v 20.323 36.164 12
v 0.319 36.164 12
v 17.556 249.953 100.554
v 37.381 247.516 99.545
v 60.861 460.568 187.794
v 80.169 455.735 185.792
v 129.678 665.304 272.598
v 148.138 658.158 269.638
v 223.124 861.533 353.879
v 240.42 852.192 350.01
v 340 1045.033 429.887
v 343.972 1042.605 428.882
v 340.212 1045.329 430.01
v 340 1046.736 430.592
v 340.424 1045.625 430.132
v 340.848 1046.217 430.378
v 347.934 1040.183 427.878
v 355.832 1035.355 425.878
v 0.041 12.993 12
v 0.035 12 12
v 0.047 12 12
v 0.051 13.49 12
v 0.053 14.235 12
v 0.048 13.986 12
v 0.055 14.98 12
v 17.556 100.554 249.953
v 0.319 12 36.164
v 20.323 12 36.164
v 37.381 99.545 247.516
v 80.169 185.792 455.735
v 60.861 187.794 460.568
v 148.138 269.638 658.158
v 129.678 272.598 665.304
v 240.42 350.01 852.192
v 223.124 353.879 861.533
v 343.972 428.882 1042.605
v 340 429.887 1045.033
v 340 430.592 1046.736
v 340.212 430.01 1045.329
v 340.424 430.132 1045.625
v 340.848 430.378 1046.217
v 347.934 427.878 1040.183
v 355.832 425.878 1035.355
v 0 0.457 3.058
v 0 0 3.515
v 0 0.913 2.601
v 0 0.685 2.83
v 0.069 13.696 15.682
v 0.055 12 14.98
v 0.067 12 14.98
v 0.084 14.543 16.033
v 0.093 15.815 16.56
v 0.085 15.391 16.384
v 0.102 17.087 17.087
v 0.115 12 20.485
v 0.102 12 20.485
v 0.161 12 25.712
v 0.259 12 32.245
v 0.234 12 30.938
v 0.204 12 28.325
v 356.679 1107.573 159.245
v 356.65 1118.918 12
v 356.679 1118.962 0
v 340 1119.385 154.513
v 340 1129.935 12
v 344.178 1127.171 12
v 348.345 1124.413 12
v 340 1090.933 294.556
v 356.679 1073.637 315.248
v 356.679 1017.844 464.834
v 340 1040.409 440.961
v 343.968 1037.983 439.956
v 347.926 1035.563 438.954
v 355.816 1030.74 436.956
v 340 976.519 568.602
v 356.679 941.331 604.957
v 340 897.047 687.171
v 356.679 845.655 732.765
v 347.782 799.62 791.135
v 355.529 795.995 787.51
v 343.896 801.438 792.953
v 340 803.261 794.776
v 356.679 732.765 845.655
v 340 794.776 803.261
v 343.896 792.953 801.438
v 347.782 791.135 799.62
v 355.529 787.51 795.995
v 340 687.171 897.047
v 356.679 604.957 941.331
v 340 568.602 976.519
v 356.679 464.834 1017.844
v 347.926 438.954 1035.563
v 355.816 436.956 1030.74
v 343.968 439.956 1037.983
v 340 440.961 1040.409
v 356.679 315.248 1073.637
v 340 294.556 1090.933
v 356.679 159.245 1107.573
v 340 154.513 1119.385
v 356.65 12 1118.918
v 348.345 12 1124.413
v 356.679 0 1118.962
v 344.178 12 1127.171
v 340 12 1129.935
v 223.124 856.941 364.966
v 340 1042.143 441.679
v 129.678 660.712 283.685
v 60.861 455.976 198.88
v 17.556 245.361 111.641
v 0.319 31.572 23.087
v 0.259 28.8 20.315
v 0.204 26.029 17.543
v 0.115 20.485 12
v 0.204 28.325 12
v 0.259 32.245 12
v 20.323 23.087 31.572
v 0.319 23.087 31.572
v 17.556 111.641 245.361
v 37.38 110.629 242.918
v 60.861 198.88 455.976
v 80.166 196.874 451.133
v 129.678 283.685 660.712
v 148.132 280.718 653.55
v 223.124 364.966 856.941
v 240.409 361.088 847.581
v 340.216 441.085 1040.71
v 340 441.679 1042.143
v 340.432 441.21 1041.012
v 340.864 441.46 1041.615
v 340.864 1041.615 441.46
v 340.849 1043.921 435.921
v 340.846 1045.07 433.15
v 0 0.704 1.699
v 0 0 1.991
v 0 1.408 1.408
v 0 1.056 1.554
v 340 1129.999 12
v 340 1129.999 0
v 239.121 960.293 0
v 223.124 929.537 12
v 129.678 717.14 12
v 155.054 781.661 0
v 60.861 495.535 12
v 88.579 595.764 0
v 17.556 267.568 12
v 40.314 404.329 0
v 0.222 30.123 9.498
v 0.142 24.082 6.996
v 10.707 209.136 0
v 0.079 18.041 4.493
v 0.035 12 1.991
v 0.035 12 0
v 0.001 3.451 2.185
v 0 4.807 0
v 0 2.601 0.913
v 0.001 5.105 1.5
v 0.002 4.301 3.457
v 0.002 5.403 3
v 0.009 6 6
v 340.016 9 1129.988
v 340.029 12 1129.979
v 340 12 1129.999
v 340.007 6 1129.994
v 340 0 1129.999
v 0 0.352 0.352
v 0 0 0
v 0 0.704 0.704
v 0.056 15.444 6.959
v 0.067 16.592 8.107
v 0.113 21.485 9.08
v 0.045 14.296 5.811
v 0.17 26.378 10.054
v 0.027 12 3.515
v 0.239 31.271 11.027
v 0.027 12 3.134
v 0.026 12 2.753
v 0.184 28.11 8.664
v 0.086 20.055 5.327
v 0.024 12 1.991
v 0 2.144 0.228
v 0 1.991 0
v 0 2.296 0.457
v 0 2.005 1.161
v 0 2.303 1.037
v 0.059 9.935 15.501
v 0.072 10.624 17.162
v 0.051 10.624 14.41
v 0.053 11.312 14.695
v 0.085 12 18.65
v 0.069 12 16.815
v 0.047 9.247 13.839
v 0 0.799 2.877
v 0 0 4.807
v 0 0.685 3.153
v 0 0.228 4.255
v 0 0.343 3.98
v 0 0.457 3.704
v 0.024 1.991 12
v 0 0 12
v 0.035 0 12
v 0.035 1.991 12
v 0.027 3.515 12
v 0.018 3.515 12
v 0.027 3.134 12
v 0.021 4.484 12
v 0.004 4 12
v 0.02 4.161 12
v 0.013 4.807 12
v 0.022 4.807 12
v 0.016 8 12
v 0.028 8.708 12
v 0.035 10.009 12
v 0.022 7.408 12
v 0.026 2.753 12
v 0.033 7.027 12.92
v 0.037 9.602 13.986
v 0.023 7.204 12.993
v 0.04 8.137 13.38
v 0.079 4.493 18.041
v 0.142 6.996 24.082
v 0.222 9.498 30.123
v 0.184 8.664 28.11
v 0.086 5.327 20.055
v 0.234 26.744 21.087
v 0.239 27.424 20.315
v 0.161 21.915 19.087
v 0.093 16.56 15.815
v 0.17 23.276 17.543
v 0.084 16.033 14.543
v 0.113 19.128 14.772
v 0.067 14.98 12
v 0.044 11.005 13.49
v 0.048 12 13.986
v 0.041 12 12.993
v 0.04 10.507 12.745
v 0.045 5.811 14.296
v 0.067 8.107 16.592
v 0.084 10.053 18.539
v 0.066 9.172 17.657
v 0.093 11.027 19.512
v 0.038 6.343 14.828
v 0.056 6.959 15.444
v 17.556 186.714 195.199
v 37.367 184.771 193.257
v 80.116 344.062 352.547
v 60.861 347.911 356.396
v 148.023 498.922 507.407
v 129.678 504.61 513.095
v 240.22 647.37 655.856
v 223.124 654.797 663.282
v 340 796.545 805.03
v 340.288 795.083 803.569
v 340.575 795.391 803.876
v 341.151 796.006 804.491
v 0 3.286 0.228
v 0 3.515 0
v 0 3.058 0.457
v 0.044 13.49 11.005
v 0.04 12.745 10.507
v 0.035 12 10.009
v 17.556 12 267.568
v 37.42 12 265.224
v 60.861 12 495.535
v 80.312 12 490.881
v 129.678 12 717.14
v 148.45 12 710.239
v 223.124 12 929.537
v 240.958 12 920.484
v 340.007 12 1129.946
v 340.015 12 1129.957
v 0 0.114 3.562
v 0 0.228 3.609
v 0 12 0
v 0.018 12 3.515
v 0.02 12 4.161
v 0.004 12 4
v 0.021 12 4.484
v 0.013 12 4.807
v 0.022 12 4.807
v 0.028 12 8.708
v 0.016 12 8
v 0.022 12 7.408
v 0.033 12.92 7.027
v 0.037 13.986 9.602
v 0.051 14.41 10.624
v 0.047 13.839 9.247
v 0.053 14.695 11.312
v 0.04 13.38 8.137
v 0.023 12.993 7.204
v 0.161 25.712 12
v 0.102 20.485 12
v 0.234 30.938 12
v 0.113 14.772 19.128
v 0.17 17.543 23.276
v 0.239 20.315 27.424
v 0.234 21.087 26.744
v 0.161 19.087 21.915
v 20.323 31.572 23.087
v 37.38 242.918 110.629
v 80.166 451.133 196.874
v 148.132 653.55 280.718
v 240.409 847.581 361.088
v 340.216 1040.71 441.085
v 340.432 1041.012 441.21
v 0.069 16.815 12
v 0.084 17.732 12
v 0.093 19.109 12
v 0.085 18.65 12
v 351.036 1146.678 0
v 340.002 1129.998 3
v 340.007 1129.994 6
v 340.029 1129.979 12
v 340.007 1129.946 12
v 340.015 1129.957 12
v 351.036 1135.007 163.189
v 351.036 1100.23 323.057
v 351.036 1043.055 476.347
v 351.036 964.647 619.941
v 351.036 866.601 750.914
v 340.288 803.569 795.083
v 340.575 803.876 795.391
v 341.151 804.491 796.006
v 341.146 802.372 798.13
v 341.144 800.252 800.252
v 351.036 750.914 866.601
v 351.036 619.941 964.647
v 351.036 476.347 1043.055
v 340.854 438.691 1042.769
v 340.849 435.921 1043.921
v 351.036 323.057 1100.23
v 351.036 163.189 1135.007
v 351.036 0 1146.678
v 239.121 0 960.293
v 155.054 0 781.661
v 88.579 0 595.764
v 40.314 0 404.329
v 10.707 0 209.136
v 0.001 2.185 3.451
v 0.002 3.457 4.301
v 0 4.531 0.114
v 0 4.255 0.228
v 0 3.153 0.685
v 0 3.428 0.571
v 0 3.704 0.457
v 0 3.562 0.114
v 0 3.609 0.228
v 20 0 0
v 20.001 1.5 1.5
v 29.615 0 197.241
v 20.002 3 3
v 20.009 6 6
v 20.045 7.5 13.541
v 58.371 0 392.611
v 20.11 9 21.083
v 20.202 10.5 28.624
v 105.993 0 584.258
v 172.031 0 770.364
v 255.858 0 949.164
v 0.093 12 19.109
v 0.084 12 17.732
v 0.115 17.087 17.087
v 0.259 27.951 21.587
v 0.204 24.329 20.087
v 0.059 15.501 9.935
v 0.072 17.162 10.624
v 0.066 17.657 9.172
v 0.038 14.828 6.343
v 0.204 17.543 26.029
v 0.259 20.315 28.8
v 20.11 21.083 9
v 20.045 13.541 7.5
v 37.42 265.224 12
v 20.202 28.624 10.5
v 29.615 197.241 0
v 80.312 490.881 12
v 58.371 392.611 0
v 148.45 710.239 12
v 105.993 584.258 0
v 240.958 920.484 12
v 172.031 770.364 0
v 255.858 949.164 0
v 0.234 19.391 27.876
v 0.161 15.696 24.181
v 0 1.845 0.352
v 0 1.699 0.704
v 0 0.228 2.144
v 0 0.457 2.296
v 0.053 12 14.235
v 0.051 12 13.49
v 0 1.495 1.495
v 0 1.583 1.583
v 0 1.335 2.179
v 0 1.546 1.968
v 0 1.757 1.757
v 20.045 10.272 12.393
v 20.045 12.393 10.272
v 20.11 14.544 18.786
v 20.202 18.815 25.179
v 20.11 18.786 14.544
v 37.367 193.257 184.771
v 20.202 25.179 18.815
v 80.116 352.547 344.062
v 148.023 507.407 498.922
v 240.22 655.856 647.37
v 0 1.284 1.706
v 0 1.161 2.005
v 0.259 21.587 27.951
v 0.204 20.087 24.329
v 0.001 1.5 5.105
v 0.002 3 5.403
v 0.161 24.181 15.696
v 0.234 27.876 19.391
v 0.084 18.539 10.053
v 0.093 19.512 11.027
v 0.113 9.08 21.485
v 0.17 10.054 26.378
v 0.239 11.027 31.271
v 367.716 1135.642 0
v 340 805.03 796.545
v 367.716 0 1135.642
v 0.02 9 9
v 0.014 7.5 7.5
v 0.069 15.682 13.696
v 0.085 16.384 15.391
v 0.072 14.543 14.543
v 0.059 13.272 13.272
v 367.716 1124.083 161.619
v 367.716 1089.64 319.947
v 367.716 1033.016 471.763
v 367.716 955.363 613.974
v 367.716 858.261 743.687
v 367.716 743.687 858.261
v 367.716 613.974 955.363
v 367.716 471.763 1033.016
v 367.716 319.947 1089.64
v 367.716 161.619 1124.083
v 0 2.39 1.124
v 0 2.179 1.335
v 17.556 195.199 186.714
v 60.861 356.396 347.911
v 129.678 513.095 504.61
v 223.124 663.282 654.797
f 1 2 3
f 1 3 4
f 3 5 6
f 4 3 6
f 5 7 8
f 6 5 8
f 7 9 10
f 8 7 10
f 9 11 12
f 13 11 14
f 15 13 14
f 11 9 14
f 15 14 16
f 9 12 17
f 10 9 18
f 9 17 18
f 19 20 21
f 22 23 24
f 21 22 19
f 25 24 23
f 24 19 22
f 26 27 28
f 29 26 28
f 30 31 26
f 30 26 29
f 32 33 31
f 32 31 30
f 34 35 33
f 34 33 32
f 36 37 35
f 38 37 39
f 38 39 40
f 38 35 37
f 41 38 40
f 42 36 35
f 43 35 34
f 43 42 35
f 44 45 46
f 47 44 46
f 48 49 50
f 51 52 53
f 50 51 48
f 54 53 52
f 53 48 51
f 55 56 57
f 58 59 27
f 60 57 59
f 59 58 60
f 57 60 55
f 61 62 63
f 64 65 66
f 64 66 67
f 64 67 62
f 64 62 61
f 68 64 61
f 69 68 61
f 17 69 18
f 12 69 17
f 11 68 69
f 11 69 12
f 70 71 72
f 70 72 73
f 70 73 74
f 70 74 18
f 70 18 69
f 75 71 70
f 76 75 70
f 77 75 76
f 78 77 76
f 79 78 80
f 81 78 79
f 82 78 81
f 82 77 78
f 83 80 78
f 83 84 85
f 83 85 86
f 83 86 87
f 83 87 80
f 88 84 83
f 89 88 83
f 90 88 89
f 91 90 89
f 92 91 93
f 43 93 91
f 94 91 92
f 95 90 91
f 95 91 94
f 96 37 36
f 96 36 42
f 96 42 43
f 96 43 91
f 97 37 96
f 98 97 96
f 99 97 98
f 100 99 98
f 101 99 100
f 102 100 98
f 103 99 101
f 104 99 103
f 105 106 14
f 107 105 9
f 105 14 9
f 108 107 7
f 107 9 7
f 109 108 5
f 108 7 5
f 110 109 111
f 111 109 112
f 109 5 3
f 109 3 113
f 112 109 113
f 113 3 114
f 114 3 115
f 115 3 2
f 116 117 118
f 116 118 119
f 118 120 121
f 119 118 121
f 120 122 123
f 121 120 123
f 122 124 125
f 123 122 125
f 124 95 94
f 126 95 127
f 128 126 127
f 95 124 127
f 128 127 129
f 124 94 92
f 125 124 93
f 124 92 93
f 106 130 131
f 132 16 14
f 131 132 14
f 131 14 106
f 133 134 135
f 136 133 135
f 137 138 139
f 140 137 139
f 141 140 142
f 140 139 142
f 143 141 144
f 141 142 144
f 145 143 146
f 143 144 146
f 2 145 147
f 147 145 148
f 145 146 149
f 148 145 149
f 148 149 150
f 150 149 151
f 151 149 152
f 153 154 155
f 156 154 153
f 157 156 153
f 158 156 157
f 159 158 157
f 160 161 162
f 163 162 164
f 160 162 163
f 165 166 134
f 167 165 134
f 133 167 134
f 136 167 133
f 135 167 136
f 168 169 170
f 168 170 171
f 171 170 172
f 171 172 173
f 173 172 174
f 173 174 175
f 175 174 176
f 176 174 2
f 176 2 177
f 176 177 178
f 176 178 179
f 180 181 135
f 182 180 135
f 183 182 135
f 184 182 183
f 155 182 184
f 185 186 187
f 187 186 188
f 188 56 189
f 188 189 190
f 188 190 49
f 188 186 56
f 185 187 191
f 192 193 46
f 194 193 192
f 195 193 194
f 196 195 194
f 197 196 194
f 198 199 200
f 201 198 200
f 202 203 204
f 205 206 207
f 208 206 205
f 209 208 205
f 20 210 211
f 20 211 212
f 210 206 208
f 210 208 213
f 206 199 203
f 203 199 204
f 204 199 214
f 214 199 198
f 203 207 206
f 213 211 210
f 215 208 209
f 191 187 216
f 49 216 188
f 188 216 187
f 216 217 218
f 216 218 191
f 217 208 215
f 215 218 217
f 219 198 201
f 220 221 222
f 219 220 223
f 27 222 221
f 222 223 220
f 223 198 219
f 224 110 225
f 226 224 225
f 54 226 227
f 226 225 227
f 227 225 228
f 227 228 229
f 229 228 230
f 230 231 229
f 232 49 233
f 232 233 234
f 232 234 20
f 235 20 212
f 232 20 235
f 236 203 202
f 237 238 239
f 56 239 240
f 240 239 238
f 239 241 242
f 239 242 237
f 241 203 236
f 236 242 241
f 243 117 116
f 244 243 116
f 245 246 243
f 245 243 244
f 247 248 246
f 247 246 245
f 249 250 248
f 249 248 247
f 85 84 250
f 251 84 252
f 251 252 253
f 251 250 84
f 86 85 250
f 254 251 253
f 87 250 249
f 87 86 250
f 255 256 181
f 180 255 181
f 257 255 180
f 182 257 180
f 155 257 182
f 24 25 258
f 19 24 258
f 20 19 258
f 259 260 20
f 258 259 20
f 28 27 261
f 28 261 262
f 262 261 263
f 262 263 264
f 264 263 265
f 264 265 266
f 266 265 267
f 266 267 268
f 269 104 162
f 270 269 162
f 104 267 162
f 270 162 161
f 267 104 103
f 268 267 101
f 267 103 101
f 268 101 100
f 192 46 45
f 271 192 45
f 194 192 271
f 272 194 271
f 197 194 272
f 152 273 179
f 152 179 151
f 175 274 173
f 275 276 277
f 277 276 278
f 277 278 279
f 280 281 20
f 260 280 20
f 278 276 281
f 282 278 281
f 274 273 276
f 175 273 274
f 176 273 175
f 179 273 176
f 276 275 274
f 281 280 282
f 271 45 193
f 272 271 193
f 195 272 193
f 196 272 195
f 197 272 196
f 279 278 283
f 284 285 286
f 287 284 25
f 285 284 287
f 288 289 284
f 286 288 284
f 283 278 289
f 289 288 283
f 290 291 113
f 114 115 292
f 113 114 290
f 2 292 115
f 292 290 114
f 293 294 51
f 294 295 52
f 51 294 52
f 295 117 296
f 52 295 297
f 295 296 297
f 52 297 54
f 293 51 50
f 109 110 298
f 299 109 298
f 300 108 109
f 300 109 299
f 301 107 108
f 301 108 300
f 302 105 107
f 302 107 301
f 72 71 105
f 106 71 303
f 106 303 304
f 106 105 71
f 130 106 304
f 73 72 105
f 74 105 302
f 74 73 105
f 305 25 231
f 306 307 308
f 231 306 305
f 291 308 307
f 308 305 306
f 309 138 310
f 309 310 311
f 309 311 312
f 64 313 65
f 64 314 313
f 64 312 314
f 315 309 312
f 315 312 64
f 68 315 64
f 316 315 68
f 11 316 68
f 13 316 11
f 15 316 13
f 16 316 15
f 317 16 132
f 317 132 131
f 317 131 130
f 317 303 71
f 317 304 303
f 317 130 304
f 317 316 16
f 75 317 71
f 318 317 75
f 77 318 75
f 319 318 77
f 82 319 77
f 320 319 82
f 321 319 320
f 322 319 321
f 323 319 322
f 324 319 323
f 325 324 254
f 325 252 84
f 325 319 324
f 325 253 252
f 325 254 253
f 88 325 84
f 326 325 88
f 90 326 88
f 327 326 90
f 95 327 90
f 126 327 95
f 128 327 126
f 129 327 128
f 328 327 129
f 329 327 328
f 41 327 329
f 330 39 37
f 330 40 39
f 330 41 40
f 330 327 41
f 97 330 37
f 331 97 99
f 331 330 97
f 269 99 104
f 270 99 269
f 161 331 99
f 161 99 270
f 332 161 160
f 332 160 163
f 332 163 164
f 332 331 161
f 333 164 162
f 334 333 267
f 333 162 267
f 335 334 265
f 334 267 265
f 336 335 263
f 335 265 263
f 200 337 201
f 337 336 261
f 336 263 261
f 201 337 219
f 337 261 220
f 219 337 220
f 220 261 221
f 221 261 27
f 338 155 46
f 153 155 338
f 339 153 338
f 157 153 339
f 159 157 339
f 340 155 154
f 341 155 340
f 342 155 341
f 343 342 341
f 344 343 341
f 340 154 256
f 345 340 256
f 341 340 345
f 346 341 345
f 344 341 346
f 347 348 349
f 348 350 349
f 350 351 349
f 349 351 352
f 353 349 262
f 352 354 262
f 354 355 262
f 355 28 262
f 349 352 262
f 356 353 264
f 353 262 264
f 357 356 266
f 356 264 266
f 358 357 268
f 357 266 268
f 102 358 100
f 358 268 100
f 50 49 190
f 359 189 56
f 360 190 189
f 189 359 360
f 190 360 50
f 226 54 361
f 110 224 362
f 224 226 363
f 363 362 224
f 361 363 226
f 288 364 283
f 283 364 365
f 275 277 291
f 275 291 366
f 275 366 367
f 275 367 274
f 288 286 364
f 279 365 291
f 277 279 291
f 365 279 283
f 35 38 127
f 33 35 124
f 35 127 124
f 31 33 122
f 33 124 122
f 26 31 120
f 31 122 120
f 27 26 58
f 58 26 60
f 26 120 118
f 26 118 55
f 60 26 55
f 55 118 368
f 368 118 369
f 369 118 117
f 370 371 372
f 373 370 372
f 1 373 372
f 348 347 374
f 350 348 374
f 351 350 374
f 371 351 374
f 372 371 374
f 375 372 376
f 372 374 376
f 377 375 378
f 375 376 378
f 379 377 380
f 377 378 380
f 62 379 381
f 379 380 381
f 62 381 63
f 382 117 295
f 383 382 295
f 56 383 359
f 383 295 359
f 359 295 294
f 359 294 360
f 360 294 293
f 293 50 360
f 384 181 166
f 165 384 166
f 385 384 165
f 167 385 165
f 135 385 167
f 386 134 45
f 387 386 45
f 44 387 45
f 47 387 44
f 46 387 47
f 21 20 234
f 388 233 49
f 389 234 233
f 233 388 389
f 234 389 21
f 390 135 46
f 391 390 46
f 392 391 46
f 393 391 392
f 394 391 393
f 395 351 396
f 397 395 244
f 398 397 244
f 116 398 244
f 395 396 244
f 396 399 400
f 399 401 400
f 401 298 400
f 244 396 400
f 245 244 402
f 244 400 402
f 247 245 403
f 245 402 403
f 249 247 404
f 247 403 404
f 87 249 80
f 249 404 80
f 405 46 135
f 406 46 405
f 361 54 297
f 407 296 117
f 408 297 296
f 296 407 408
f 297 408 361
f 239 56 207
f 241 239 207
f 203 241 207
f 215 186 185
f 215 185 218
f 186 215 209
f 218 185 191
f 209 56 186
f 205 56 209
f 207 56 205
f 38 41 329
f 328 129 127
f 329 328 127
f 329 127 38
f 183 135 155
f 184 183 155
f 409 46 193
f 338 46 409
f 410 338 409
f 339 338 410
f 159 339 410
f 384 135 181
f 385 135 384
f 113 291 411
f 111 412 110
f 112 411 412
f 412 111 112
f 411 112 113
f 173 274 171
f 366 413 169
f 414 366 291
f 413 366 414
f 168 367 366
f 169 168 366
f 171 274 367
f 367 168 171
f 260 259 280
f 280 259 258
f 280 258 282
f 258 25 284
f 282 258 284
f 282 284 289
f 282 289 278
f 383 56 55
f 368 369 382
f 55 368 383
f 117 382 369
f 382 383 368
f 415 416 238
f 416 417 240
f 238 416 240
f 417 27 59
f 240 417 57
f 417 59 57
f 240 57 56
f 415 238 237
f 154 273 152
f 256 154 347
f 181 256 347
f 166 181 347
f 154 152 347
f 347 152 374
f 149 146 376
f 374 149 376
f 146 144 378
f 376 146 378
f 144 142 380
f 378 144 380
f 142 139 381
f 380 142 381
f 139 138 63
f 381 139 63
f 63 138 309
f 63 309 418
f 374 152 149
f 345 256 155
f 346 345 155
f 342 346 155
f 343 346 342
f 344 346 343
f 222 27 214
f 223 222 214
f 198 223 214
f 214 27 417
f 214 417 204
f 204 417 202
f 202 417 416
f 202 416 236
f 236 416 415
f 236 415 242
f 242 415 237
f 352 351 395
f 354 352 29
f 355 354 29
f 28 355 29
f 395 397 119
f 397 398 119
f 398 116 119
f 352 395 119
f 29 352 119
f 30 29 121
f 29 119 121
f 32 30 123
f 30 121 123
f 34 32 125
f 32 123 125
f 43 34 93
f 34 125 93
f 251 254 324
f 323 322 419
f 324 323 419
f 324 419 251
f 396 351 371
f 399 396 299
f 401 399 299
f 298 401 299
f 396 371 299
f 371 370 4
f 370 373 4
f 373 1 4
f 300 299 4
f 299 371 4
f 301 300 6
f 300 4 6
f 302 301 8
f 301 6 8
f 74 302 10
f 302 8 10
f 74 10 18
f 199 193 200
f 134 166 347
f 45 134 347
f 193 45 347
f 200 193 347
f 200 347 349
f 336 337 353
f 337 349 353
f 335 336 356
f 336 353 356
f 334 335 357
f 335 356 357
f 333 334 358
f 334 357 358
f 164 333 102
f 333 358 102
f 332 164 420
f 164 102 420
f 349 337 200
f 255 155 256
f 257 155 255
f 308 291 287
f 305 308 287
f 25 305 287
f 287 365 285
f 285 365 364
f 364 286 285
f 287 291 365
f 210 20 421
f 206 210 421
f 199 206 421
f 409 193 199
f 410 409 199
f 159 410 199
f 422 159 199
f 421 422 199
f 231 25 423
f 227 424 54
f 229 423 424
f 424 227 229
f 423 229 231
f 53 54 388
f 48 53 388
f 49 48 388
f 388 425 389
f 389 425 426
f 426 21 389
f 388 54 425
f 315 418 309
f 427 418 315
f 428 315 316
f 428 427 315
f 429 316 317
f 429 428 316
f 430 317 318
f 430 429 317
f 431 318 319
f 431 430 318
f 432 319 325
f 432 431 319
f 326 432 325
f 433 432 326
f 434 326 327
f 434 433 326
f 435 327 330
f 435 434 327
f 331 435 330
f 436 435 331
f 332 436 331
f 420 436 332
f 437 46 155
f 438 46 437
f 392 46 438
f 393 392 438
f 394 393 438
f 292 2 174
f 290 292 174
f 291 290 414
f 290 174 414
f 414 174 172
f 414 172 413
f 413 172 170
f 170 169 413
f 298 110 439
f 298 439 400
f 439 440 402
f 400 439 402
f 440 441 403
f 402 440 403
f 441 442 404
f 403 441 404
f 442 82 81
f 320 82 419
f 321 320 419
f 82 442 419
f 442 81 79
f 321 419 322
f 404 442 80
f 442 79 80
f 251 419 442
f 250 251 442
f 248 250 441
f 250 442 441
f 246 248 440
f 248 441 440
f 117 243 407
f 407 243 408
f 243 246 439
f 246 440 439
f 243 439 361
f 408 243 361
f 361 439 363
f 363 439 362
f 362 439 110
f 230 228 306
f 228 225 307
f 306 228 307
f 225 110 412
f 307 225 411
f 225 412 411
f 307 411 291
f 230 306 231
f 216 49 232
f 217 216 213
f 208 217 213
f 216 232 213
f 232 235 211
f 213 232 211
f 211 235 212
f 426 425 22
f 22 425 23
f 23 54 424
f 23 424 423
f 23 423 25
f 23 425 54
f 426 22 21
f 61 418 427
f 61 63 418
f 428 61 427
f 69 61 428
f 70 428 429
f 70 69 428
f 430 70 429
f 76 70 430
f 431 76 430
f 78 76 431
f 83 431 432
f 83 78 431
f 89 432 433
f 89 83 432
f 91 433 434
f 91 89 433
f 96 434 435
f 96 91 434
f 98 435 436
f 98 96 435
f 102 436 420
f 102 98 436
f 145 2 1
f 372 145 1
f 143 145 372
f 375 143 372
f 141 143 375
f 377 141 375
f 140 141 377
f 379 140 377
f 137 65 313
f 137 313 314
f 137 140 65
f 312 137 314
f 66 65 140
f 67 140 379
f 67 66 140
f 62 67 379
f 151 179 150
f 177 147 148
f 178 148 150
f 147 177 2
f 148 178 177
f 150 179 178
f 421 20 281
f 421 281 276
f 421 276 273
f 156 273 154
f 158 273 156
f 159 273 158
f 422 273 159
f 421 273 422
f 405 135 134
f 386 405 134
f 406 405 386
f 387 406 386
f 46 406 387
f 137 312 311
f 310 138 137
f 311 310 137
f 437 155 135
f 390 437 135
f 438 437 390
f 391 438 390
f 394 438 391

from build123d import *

# Parameters (mm, degrees)
BOSS_EXTRUDE1_DEPTH = 12
CIRPATTERN1_COUNT   = 5
CIRPATTERN1_ANGLE   = 90
CUT_EXTRUDE1_DEPTH  = 1638.380394587


with BuildPart() as part:
    # Sketch2 → Boss-Extrude1 (new body)
    with BuildSketch(Plane.XY):
        with BuildLine():
            Line((0, 0), (20, 0))
            ThreePointArc((20, 0), (105.993208992, 584.258082126), (356.679347003, 1118.962485261))
            Line((356.679347003, 1118.962485261), (340, 1129.998761061))
            ThreePointArc((340, 1129.998761061), (86.841356078, 590.020592861), (0, 0))
        make_face()
    boss_extrude1 = extrude(amount=BOSS_EXTRUDE1_DEPTH)

    # CirPattern1: Boss-Extrude1 ×5 about axis
    cirpattern1_axis = Axis((-103.3895, 6, 6), (1, 0, 0))
    for i in range(1, CIRPATTERN1_COUNT):
        add(boss_extrude1.rotate(cirpattern1_axis, i * CIRPATTERN1_ANGLE / (CIRPATTERN1_COUNT - 1)))

    # Sketch3 → Cut-Extrude1 (cut, through all)
    with BuildSketch(Plane(origin=(0, 0, 0), x_dir=(0, 0, -1), z_dir=(1, 0, 0))):
        Polygon((0, 0), (0, 11.27415685), (5.748633728, 11.27415685), (5.748633728, -8.438156221), (-12.082999297, -8.438156221), (-12, 0), align=None)
    extrude(amount=CUT_EXTRUDE1_DEPTH, mode=Mode.SUBTRACT)

    # Sweep1: sweep along a path in Sketch5
    with BuildLine(Plane(origin=(0, 0, 0), x_dir=(0, 0, -1), z_dir=(1, 0, 0))) as sweep1_path:
        ThreePointArc((0, 1130), (-799.030662741, 799.030662741), (-1130, 0))
    # Sketch4 → Sweep1 (sweep)
    with BuildSketch(Plane(origin=(0, 0, 0), x_dir=(-1, 0, 0), z_dir=(0, 0, -1))):
        Polygon((-340, 1129.998761061), (-356.679347003, 1118.962485261), (-367.715622804, 1135.641832264), (-351.0362758, 1146.678108065), align=None)
    sweep(path=sweep1_path.line)


solid = part.part
